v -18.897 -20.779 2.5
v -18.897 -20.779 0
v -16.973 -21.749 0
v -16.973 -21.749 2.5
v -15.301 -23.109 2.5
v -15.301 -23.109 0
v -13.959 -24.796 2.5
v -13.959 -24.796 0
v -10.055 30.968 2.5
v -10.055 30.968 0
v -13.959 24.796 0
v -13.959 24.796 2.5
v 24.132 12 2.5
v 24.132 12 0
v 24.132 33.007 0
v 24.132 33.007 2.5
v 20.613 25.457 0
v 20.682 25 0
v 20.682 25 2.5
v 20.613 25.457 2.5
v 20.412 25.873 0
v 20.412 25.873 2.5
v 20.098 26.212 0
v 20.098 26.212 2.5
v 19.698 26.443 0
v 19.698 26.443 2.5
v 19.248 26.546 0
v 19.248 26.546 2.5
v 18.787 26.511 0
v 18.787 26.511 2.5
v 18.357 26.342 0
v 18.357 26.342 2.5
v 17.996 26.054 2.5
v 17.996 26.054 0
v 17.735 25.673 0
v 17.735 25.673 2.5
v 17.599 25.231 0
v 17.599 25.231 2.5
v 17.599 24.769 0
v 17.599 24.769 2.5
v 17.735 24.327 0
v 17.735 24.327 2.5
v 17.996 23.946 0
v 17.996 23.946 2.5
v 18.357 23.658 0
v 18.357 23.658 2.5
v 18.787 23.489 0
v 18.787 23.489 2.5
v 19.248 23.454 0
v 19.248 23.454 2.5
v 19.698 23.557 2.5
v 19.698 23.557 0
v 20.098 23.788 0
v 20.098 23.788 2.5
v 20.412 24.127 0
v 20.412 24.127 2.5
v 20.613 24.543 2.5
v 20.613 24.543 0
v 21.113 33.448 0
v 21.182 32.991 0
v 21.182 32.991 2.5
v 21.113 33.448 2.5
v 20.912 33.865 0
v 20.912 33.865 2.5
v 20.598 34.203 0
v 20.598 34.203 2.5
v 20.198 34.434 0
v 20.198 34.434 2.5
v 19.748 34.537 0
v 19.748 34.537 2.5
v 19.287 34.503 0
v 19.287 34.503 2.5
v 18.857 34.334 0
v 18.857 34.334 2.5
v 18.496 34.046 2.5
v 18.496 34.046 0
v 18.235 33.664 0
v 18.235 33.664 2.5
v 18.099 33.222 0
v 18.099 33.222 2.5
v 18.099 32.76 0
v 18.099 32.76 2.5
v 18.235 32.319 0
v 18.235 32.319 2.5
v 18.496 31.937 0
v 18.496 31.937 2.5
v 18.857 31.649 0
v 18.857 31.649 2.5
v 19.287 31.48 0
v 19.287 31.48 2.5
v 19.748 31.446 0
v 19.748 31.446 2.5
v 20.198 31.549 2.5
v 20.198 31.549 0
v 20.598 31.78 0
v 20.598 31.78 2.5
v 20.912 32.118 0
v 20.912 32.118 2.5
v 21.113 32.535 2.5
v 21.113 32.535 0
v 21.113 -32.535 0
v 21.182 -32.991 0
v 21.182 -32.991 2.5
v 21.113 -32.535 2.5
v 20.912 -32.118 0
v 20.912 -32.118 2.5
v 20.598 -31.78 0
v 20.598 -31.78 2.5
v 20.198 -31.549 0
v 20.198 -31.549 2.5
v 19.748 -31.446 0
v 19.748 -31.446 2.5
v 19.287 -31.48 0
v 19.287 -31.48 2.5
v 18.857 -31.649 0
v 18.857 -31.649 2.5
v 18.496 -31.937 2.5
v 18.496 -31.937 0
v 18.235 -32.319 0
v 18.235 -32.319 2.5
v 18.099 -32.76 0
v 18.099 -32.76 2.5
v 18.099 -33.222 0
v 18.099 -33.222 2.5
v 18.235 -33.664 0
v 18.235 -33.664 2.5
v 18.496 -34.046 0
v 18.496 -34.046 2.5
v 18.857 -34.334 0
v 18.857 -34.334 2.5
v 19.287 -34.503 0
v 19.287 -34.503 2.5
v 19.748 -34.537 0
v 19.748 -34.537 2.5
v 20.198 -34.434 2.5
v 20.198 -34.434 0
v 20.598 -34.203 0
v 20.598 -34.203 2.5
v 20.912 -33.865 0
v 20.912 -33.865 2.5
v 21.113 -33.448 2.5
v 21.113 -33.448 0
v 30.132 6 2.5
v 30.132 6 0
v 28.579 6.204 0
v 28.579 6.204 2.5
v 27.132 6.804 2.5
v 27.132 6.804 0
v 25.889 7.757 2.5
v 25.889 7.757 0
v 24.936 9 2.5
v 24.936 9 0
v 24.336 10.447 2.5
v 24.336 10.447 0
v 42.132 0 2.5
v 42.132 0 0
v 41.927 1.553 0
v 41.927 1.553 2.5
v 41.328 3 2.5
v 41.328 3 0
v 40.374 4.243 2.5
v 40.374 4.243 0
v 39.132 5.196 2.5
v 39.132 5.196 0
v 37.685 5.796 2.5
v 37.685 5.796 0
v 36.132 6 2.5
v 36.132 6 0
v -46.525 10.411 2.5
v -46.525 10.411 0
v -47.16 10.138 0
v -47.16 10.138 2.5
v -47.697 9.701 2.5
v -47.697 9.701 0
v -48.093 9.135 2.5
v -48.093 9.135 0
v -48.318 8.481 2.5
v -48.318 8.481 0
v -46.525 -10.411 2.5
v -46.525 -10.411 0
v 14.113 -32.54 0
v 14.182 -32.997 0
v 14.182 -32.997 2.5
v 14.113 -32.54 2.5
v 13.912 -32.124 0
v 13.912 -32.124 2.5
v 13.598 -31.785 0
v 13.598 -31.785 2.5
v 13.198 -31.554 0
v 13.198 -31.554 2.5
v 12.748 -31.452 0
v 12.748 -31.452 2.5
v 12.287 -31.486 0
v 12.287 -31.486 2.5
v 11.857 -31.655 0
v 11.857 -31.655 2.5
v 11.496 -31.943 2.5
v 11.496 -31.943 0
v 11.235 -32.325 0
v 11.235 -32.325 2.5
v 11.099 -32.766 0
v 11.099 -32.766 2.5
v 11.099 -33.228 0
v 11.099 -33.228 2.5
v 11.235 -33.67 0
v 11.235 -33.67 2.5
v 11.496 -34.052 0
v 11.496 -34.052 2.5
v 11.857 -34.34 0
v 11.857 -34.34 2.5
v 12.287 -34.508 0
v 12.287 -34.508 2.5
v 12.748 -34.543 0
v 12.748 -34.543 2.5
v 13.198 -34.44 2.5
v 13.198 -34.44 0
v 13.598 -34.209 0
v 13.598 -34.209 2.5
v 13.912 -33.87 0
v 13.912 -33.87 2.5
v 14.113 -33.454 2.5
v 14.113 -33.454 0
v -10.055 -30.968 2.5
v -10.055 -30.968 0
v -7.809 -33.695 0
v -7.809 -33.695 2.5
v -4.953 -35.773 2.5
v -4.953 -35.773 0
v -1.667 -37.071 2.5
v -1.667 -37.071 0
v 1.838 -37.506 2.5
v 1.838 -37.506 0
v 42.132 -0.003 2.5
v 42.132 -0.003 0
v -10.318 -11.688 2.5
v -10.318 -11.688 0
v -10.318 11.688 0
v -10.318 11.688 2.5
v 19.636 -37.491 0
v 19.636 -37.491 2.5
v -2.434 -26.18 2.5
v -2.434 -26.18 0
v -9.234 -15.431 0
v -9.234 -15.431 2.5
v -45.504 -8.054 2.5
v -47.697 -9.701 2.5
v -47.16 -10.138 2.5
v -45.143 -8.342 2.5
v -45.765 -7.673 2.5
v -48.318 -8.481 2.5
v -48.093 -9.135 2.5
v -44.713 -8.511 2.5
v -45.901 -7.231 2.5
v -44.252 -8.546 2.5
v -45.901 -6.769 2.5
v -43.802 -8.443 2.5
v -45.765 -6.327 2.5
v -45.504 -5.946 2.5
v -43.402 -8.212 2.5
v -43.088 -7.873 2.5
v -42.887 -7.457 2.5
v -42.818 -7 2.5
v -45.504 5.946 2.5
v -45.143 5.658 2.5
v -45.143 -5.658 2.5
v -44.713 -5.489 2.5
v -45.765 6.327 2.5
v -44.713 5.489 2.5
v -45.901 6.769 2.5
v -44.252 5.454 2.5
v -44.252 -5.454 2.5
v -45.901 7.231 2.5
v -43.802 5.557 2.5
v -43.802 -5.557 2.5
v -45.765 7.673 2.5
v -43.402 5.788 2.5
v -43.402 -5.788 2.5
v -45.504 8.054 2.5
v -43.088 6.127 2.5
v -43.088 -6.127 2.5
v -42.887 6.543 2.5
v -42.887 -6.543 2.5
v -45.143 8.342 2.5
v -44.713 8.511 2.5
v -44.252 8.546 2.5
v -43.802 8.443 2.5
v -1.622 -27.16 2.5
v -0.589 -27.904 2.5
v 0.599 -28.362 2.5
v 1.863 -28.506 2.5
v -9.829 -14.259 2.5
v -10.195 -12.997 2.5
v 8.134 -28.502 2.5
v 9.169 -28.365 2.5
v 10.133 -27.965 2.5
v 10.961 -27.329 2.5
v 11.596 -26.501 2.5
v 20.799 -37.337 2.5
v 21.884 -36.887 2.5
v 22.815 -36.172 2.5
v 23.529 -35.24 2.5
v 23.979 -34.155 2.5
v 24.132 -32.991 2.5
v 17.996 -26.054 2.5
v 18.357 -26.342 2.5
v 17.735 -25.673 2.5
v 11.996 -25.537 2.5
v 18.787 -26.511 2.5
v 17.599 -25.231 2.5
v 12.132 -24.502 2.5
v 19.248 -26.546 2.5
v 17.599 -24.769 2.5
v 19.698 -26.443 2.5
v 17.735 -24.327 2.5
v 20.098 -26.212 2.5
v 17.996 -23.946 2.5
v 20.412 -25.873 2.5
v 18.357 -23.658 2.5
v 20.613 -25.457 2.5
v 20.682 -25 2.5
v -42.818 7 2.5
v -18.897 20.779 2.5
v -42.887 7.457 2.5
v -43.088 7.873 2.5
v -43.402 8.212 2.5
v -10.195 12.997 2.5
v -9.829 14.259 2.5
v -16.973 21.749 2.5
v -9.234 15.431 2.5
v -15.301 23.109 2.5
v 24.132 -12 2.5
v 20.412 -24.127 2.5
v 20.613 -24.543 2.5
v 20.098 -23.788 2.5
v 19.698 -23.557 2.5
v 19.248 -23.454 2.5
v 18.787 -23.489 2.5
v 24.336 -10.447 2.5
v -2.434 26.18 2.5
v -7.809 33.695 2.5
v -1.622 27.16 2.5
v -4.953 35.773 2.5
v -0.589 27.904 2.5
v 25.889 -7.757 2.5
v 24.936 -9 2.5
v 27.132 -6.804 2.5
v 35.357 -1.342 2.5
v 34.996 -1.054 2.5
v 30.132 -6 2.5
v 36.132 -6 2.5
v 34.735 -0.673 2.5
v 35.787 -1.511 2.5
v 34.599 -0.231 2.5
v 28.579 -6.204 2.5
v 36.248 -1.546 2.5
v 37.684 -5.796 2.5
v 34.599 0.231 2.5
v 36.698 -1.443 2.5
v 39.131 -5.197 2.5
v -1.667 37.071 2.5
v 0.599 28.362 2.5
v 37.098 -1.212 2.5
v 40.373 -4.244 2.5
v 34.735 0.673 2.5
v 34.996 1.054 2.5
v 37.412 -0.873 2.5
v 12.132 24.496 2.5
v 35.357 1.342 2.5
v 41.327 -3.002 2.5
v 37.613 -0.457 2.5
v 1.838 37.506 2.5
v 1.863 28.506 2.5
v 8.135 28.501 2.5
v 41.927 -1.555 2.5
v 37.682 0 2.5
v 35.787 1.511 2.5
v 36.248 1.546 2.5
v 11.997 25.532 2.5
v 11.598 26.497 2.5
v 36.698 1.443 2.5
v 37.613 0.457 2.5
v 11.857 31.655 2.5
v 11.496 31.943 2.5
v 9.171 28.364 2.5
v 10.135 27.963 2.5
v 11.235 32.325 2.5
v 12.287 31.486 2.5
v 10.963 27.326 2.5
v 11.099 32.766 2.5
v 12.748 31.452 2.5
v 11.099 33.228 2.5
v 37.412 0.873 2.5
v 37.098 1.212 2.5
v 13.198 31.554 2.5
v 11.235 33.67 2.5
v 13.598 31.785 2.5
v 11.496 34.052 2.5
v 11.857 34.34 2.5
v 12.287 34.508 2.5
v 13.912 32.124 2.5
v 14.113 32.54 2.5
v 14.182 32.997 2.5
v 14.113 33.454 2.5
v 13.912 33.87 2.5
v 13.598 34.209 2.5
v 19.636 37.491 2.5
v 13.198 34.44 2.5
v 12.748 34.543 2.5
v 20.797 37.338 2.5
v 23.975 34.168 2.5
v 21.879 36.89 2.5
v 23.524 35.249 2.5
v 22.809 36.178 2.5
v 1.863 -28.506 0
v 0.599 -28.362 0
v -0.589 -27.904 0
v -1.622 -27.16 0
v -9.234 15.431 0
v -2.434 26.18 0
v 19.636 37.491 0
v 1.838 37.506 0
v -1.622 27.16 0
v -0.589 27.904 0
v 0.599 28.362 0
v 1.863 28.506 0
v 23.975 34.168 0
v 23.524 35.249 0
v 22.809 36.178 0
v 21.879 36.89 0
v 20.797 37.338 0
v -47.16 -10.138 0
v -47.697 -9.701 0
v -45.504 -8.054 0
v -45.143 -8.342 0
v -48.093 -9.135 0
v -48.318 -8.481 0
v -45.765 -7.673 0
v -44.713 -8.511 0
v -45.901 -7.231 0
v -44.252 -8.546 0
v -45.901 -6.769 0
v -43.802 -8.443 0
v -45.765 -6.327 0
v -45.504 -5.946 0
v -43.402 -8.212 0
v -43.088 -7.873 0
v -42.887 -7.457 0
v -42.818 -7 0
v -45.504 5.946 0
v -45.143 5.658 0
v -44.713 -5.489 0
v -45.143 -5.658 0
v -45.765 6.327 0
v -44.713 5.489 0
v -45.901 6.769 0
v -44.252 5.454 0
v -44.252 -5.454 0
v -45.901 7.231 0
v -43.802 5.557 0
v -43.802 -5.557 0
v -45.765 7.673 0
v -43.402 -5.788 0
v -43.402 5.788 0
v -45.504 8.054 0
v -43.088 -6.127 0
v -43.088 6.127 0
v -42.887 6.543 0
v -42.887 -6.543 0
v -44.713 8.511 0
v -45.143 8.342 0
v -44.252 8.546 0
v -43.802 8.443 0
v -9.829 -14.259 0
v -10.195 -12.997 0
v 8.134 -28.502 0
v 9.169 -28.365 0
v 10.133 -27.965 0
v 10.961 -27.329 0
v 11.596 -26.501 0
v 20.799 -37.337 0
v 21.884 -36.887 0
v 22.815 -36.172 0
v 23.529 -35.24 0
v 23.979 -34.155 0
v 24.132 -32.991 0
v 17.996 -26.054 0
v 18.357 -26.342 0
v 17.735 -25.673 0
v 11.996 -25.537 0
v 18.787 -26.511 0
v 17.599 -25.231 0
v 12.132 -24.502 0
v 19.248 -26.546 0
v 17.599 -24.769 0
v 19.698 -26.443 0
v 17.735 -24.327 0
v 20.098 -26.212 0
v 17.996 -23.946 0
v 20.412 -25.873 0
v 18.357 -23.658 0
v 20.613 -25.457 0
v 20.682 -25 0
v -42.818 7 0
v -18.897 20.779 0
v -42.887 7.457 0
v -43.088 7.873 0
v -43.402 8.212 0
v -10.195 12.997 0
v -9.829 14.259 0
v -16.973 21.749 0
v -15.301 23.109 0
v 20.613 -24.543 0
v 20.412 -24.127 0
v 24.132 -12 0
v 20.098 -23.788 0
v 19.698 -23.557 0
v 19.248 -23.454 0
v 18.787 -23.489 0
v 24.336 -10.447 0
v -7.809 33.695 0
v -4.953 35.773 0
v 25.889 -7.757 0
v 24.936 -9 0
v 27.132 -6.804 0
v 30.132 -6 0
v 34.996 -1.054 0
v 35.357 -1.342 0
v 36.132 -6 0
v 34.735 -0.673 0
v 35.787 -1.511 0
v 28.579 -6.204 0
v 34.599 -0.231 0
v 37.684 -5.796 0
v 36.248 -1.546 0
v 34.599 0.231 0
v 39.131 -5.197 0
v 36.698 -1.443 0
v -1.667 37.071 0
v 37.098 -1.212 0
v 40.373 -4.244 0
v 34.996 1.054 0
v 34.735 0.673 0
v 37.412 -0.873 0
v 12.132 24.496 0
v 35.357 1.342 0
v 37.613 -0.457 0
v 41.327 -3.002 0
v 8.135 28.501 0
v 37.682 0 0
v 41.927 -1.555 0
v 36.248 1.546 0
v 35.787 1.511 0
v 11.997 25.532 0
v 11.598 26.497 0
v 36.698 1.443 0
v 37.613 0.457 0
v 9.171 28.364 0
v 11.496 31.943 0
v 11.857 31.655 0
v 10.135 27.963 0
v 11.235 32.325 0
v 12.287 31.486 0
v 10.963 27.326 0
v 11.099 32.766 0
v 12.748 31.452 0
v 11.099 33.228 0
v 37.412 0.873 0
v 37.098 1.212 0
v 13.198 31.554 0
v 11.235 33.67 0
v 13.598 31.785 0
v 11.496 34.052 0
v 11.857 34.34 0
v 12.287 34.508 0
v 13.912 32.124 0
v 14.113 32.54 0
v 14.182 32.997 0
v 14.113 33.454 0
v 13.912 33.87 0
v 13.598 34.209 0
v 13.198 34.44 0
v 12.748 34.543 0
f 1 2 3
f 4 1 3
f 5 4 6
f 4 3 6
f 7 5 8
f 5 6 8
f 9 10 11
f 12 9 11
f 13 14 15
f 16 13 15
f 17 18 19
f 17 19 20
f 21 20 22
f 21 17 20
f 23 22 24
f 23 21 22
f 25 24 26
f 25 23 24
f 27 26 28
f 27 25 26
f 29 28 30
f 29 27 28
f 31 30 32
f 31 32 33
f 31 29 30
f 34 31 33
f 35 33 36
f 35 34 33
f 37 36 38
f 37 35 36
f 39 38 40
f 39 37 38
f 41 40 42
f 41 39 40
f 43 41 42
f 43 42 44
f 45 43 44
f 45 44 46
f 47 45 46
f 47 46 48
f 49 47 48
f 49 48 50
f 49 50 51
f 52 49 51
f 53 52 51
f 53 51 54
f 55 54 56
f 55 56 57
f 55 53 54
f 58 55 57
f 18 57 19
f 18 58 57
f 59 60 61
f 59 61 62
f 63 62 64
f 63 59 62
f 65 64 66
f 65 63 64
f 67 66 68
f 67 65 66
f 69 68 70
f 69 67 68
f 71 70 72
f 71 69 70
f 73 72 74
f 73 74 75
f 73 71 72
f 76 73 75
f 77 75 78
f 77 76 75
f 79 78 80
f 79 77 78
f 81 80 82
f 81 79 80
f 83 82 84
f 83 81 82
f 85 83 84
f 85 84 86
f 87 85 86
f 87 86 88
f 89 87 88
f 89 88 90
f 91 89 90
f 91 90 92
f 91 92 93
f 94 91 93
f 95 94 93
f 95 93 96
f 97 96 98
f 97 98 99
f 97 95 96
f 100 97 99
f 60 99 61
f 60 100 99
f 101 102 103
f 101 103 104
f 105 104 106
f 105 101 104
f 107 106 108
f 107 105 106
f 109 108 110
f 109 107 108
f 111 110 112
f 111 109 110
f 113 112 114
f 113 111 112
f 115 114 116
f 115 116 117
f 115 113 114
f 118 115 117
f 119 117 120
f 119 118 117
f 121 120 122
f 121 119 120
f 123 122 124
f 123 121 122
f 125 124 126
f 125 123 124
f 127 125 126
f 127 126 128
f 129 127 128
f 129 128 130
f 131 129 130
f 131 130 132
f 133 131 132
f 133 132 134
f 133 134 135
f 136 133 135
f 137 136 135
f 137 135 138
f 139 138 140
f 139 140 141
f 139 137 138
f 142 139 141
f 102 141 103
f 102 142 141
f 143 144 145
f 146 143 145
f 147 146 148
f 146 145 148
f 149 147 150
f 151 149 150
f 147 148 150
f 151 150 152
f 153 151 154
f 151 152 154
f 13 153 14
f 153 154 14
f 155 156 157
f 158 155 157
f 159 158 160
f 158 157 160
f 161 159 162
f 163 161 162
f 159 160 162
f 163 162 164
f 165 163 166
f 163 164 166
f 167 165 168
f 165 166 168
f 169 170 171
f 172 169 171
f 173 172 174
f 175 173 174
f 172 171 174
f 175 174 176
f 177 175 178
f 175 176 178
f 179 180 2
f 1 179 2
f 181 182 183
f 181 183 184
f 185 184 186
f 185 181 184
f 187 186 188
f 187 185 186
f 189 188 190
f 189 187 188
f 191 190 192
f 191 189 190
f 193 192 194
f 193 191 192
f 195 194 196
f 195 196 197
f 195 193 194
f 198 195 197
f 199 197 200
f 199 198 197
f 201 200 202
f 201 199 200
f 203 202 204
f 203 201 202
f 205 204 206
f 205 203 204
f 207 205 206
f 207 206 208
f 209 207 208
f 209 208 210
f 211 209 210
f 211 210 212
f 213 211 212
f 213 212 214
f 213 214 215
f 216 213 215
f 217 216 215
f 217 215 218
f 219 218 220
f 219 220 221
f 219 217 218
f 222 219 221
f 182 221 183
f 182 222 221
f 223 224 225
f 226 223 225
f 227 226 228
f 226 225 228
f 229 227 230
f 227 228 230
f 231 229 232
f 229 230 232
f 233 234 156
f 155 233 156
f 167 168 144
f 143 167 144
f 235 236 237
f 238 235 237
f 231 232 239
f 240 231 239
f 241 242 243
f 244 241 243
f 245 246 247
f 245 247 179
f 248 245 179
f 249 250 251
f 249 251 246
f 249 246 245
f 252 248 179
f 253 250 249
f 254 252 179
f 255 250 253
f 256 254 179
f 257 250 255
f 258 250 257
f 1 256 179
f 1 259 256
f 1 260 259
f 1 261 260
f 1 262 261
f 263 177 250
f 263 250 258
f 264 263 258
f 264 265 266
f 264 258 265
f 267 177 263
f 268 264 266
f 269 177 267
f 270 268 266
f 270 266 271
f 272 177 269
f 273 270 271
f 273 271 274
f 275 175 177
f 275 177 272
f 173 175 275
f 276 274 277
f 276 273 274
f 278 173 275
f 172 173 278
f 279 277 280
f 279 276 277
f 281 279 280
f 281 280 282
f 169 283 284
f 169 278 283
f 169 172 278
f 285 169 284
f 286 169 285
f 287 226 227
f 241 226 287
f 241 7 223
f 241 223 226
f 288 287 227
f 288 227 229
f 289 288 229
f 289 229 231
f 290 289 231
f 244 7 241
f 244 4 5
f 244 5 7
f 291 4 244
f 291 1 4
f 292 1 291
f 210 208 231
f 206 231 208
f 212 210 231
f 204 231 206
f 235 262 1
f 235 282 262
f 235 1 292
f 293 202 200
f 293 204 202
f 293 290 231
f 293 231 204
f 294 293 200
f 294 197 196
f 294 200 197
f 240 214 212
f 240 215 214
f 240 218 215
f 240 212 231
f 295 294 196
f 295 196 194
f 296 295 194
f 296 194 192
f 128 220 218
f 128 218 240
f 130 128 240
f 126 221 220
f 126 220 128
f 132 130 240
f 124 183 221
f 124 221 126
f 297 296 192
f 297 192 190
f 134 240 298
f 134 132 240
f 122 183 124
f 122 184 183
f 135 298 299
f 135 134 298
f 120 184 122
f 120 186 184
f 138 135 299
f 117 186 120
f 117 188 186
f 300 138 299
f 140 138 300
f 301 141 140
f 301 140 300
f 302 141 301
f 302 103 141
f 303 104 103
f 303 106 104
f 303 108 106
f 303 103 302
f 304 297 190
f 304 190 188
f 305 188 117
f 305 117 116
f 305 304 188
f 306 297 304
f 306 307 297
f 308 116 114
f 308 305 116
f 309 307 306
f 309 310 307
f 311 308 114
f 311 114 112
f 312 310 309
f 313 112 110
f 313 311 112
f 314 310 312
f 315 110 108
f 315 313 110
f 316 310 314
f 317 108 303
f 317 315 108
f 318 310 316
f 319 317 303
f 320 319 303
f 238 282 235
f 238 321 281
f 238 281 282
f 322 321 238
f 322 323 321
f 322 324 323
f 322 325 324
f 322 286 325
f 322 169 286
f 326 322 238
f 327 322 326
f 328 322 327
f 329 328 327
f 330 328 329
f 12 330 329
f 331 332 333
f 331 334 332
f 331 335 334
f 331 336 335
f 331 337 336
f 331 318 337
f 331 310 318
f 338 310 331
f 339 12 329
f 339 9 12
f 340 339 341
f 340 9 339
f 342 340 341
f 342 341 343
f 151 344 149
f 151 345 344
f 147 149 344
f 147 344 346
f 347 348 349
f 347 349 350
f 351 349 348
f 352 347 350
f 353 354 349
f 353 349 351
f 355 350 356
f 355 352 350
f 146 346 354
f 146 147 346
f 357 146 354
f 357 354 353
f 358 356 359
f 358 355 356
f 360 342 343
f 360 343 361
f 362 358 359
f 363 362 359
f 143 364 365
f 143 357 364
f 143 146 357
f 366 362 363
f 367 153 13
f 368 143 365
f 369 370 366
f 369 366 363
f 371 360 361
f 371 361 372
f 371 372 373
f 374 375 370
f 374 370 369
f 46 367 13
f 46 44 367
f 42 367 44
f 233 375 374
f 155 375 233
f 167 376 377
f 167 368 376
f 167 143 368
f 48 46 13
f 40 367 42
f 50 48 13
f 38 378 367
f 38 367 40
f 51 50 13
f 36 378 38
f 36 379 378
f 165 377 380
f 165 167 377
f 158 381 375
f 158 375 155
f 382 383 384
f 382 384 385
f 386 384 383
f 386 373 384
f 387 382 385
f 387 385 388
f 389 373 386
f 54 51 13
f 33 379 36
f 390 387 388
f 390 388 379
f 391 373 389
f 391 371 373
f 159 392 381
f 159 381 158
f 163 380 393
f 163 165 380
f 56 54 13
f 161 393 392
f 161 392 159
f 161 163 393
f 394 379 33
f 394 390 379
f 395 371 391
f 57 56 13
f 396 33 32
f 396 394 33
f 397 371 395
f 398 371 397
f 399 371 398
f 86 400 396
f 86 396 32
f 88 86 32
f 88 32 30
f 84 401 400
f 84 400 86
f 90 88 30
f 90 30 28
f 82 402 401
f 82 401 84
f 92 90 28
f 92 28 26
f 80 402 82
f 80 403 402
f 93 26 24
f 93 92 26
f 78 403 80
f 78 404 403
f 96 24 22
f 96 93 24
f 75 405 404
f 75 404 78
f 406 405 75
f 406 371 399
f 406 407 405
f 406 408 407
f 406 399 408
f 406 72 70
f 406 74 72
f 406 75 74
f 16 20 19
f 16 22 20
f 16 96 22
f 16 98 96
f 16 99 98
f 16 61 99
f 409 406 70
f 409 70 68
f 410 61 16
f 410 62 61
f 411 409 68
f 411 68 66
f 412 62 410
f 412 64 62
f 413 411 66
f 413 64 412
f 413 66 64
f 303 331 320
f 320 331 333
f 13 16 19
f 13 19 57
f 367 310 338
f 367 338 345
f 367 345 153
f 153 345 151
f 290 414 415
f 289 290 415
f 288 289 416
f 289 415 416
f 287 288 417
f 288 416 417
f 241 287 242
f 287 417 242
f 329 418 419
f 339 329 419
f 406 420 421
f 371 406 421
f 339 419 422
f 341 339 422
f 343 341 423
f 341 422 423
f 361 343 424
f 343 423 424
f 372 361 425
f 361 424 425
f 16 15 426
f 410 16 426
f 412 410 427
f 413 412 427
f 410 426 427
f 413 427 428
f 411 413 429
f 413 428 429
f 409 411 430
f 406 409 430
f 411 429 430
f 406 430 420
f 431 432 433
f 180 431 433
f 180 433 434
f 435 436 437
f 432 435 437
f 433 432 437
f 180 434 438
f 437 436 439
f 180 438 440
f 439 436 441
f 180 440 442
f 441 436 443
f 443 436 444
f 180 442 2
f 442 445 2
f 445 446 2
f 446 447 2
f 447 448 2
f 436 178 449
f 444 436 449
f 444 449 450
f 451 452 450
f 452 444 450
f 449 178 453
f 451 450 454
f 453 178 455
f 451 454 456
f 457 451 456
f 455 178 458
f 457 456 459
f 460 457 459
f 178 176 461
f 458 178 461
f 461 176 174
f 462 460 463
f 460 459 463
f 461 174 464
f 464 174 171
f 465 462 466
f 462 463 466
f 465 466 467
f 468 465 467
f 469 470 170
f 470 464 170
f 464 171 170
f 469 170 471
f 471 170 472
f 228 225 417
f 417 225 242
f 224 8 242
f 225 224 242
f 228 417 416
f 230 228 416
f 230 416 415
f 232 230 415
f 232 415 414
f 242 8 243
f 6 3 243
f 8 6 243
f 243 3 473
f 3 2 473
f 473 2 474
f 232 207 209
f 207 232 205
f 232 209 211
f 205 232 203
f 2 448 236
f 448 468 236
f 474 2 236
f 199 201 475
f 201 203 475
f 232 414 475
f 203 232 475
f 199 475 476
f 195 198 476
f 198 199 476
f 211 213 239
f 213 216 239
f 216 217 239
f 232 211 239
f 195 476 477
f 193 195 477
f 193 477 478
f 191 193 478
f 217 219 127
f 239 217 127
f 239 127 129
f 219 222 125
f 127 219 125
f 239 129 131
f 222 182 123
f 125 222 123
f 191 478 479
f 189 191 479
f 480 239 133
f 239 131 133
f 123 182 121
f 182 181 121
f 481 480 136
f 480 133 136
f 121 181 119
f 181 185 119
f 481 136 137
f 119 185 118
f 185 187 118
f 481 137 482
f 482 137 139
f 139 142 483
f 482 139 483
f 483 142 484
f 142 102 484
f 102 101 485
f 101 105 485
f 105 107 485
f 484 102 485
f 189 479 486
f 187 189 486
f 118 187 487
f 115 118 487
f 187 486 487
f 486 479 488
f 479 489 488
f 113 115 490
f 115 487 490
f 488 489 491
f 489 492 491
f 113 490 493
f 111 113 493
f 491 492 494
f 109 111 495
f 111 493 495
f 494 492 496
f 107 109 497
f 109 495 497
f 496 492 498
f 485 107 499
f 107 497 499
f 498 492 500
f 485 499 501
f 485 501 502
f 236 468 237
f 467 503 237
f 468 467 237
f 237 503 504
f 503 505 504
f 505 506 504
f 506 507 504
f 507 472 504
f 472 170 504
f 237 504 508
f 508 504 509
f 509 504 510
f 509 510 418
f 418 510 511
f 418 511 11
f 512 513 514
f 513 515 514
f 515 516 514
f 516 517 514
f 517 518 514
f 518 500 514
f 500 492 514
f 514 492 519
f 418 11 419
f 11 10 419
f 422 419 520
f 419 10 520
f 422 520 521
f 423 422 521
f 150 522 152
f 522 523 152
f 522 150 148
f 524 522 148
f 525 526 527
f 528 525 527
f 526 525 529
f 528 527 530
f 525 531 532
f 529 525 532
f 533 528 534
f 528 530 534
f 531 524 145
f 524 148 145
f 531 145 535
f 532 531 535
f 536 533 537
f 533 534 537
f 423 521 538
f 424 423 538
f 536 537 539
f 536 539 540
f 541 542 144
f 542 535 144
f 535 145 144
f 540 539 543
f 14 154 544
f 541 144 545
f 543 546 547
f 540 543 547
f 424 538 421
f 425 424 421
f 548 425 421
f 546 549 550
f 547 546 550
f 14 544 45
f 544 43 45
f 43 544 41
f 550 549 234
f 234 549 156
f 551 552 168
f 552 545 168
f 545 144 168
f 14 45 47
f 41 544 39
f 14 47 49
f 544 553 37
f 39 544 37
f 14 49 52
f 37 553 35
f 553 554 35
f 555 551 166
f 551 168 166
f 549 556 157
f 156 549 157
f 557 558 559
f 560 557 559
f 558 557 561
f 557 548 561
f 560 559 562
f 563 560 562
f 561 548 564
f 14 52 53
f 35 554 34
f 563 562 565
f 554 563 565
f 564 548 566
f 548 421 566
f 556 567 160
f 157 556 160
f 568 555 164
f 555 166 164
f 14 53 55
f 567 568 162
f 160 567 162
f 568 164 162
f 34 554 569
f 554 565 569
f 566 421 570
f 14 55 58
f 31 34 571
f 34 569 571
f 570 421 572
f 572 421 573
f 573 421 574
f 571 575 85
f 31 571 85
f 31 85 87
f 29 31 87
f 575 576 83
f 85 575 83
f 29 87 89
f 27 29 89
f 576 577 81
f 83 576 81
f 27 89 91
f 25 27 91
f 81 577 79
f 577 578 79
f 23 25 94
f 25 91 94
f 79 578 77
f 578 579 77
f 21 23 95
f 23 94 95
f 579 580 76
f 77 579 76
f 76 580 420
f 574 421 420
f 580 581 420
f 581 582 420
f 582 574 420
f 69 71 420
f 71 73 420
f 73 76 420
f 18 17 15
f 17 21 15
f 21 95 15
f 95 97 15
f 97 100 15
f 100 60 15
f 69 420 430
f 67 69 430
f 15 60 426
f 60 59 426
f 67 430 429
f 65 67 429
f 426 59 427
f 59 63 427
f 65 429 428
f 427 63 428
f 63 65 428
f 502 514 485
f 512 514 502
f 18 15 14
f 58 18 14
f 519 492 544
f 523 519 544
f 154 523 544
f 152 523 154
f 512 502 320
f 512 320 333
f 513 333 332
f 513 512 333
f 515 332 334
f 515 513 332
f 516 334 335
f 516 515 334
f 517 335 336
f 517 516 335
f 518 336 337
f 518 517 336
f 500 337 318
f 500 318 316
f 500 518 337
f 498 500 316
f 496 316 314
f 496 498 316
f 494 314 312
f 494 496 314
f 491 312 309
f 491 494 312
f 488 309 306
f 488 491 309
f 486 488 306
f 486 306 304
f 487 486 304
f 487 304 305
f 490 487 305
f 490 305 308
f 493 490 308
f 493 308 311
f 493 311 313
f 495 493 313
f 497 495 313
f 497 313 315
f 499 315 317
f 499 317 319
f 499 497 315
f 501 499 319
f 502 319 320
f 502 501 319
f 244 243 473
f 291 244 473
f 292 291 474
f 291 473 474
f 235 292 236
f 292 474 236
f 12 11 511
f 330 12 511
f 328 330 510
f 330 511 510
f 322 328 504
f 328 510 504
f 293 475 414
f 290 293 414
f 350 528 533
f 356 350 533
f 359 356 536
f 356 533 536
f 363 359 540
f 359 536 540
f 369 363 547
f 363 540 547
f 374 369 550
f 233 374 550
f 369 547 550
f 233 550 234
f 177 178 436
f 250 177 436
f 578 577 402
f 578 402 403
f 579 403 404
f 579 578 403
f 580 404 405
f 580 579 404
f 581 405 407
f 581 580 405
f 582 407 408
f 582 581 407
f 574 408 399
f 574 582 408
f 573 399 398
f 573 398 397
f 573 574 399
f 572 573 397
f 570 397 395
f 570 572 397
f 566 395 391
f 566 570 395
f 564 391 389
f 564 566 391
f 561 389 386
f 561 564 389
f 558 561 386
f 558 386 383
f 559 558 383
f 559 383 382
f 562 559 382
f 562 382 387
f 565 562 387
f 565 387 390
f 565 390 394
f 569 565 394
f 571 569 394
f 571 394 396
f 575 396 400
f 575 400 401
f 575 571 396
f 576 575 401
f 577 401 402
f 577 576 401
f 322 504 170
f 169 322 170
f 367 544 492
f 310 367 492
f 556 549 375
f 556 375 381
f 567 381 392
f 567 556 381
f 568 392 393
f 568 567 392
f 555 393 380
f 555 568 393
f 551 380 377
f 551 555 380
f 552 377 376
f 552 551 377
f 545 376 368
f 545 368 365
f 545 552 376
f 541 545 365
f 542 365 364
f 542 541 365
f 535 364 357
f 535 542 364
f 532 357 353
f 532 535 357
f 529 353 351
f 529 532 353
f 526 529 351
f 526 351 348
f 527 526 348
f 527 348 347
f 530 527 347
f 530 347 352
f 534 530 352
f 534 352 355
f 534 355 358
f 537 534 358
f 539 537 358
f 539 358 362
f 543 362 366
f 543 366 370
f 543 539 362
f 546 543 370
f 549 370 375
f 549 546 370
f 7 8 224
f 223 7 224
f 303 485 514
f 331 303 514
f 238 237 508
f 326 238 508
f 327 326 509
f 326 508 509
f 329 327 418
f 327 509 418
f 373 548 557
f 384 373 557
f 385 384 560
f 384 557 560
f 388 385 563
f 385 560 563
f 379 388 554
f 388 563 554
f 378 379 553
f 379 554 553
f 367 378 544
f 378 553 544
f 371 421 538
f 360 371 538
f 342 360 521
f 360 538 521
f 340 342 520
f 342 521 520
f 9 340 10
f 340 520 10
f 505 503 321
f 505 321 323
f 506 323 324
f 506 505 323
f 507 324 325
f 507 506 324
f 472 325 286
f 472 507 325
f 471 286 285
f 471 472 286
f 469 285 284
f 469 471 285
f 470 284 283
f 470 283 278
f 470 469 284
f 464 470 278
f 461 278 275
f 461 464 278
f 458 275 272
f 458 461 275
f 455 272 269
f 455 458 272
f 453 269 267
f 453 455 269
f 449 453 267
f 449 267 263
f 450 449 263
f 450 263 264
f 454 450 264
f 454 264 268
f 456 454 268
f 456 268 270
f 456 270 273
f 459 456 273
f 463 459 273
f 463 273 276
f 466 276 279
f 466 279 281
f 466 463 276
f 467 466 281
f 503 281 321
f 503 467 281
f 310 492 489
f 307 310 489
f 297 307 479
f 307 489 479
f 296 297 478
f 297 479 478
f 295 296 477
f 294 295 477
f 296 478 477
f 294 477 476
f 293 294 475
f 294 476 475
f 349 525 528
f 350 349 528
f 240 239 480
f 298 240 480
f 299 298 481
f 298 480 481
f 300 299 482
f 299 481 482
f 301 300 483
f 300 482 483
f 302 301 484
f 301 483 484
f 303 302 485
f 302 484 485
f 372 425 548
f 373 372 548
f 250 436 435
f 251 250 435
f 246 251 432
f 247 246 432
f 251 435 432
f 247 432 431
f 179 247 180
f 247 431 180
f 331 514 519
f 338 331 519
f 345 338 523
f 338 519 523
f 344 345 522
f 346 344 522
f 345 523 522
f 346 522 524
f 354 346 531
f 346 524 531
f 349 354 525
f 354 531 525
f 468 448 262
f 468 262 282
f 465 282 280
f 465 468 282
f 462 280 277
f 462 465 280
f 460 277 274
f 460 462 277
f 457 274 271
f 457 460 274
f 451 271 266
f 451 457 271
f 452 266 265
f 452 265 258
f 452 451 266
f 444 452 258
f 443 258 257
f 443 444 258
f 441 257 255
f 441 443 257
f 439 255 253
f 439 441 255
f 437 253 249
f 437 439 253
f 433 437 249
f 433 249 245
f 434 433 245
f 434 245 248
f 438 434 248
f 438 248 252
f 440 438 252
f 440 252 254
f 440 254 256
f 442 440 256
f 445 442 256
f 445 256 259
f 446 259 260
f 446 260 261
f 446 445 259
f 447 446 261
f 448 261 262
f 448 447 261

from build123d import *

# Parameters (mm, degrees)
F0_R     = 1.55
F1_DEPTH = 2.5


# Not quite as in the source:
# - ends of sketch curves that miss each other by under 0.0002 mm in the source are joined


with BuildPart() as f1:
    # F0 (on Top) → F1 (new body)
    with BuildSketch(Plane.XY):
        with BuildLine():
            Line((24.1317584196, 12.0030992724), (24.1317584196, 33.007258608))
            ThreePointArc((24.1317584196, 33.007258608), (22.8094861978, 36.1776713218), (19.6355297089, 37.4914143753))
            Line((19.6355297089, 37.4914143753), (1.8379933168, 37.5062195629))
            ThreePointArc((1.8379933168, 37.5062195629), (-4.952633867, 35.7733094677), (-10.0545165801, 30.9684798423))
            Line((-10.0545165801, 30.9684798423), (-13.9594315472, 24.7955182975))
            ThreePointArc((-13.9594315472, 24.7955182975), (-16.1001567778, 22.383955311), (-18.8970513925, 20.7790499976))
            Line((-18.8970513925, 20.7790499976), (-46.5253097099, 10.4110515716))
            ThreePointArc((-46.5253097099, 10.4110515716), (-47.6965598622, 9.7014043841), (-48.3182136925, 8.4811697487))
            Line((-48.3182136925, 8.4811697487), (-48.3182136925, -8.4811697487))
            ThreePointArc((-48.3182136925, -8.4811697487), (-47.6965598622, -9.7014043841), (-46.5253097099, -10.4110515716))
            Line((-46.5253097099, -10.4110515716), (-18.8970513925, -20.7790499976))
            ThreePointArc((-18.8970513925, -20.7790499976), (-16.1001567778, -22.383955311), (-13.9594315472, -24.7955182975))
            Line((-13.9594315472, -24.7955182975), (-10.0545165801, -30.9684798423))
            ThreePointArc((-10.0545165801, -30.9684798423), (-4.952633867, -35.7733094677), (1.8379933168, -37.5062195629))
            Line((1.8379933168, -37.5062195629), (19.635501821, -37.4914143985))
            ThreePointArc((19.635501821, -37.4914143985), (22.8150621521, -36.1720727032), (24.1317584196, -32.9914159555))
            Line((24.1317584196, -32.9914159555), (24.1317584196, -12.0030992724))
            Line((24.1317584196, -12.0030992724), (24.1317584196, -12))
            ThreePointArc((24.1317584196, -12), (25.8891177325, -7.7573593129), (30.1317584196, -6))
            Line((30.1317584196, -6), (36.1317584196, -6))
            ThreePointArc((36.1317584196, -6), (40.3733032071, -4.2437363038), (42.1317576192, -0.003099272))
            Line((42.1317576192, -0.003099272), (42.1317584196, 0))
            ThreePointArc((42.1317584196, 0), (40.3743991067, 4.2426406871), (36.1317584196, 6))
            Line((36.1317584196, 6), (30.1317584196, 6))
            ThreePointArc((30.1317584196, 6), (25.8891177325, 7.7573593129), (24.1317584196, 12))
            Line((24.1317584196, 12), (24.1317584196, 12.0030992724))
        make_face()
        with Locations((-44.3682136925, -7)):
            Circle(F0_R, mode=Mode.SUBTRACT)
        with Locations((12.6317863075, -32.997239003)):
            Circle(F0_R, mode=Mode.SUBTRACT)
        with Locations((19.1317584196, -25)):
            Circle(F0_R, mode=Mode.SUBTRACT)
        with Locations((19.6317863075, -32.9914159323)):
            Circle(F0_R, mode=Mode.SUBTRACT)
        with Locations((-44.3682136925, 7)):
            Circle(F0_R, mode=Mode.SUBTRACT)
        with BuildLine():
            Line((-9.2339508783, 15.4306240067), (-2.4342503505, 26.1797159146))
            ThreePointArc((-2.4342503505, 26.1797159146), (-0.5889861734, 27.9038009834), (1.8634800061, 28.5061952445))
            Line((1.8634800061, 28.5061952445), (8.1350890009, 28.5009780993))
            ThreePointArc((8.1350890009, 28.5009780993), (10.9631282223, 27.3264639859), (12.1317584196, 24.4959882833))
            Line((12.1317584196, 24.4959882833), (12.1317584196, -24.5019407212))
            ThreePointArc((12.1317584196, -24.5019407212), (10.9611450551, -27.3294080096), (8.1344727862, -28.5019398002))
            Line((8.1344727862, -28.5019398002), (1.8634800061, -28.5061952445))
            ThreePointArc((1.8634800061, -28.5061952445), (-0.5889861734, -27.9038009834), (-2.4342503505, -26.1797159146))
            Line((-2.4342503505, -26.1797159146), (-9.2339508783, -15.4306240067))
            ThreePointArc((-9.2339508783, -15.4306240067), (-10.0416860208, -13.6364803831), (-10.3182136925, -11.688424981))
            Line((-10.3182136925, -11.688424981), (-10.3182136925, 11.688424981))
            ThreePointArc((-10.3182136925, 11.688424981), (-10.0416860208, 13.6364803831), (-9.2339508783, 15.4306240067))
        make_face(mode=Mode.SUBTRACT)
        with Locations((36.1317584196, 0)):
            Circle(F0_R, mode=Mode.SUBTRACT)
        with Locations((19.1317584196, 25)):
            Circle(F0_R, mode=Mode.SUBTRACT)
        with Locations((12.6317863075, 32.997239003)):
            Circle(F0_R, mode=Mode.SUBTRACT)
        with Locations((19.6317863075, 32.9914159323)):
            Circle(F0_R, mode=Mode.SUBTRACT)
    extrude(amount=F1_DEPTH)


solid = f1.part
